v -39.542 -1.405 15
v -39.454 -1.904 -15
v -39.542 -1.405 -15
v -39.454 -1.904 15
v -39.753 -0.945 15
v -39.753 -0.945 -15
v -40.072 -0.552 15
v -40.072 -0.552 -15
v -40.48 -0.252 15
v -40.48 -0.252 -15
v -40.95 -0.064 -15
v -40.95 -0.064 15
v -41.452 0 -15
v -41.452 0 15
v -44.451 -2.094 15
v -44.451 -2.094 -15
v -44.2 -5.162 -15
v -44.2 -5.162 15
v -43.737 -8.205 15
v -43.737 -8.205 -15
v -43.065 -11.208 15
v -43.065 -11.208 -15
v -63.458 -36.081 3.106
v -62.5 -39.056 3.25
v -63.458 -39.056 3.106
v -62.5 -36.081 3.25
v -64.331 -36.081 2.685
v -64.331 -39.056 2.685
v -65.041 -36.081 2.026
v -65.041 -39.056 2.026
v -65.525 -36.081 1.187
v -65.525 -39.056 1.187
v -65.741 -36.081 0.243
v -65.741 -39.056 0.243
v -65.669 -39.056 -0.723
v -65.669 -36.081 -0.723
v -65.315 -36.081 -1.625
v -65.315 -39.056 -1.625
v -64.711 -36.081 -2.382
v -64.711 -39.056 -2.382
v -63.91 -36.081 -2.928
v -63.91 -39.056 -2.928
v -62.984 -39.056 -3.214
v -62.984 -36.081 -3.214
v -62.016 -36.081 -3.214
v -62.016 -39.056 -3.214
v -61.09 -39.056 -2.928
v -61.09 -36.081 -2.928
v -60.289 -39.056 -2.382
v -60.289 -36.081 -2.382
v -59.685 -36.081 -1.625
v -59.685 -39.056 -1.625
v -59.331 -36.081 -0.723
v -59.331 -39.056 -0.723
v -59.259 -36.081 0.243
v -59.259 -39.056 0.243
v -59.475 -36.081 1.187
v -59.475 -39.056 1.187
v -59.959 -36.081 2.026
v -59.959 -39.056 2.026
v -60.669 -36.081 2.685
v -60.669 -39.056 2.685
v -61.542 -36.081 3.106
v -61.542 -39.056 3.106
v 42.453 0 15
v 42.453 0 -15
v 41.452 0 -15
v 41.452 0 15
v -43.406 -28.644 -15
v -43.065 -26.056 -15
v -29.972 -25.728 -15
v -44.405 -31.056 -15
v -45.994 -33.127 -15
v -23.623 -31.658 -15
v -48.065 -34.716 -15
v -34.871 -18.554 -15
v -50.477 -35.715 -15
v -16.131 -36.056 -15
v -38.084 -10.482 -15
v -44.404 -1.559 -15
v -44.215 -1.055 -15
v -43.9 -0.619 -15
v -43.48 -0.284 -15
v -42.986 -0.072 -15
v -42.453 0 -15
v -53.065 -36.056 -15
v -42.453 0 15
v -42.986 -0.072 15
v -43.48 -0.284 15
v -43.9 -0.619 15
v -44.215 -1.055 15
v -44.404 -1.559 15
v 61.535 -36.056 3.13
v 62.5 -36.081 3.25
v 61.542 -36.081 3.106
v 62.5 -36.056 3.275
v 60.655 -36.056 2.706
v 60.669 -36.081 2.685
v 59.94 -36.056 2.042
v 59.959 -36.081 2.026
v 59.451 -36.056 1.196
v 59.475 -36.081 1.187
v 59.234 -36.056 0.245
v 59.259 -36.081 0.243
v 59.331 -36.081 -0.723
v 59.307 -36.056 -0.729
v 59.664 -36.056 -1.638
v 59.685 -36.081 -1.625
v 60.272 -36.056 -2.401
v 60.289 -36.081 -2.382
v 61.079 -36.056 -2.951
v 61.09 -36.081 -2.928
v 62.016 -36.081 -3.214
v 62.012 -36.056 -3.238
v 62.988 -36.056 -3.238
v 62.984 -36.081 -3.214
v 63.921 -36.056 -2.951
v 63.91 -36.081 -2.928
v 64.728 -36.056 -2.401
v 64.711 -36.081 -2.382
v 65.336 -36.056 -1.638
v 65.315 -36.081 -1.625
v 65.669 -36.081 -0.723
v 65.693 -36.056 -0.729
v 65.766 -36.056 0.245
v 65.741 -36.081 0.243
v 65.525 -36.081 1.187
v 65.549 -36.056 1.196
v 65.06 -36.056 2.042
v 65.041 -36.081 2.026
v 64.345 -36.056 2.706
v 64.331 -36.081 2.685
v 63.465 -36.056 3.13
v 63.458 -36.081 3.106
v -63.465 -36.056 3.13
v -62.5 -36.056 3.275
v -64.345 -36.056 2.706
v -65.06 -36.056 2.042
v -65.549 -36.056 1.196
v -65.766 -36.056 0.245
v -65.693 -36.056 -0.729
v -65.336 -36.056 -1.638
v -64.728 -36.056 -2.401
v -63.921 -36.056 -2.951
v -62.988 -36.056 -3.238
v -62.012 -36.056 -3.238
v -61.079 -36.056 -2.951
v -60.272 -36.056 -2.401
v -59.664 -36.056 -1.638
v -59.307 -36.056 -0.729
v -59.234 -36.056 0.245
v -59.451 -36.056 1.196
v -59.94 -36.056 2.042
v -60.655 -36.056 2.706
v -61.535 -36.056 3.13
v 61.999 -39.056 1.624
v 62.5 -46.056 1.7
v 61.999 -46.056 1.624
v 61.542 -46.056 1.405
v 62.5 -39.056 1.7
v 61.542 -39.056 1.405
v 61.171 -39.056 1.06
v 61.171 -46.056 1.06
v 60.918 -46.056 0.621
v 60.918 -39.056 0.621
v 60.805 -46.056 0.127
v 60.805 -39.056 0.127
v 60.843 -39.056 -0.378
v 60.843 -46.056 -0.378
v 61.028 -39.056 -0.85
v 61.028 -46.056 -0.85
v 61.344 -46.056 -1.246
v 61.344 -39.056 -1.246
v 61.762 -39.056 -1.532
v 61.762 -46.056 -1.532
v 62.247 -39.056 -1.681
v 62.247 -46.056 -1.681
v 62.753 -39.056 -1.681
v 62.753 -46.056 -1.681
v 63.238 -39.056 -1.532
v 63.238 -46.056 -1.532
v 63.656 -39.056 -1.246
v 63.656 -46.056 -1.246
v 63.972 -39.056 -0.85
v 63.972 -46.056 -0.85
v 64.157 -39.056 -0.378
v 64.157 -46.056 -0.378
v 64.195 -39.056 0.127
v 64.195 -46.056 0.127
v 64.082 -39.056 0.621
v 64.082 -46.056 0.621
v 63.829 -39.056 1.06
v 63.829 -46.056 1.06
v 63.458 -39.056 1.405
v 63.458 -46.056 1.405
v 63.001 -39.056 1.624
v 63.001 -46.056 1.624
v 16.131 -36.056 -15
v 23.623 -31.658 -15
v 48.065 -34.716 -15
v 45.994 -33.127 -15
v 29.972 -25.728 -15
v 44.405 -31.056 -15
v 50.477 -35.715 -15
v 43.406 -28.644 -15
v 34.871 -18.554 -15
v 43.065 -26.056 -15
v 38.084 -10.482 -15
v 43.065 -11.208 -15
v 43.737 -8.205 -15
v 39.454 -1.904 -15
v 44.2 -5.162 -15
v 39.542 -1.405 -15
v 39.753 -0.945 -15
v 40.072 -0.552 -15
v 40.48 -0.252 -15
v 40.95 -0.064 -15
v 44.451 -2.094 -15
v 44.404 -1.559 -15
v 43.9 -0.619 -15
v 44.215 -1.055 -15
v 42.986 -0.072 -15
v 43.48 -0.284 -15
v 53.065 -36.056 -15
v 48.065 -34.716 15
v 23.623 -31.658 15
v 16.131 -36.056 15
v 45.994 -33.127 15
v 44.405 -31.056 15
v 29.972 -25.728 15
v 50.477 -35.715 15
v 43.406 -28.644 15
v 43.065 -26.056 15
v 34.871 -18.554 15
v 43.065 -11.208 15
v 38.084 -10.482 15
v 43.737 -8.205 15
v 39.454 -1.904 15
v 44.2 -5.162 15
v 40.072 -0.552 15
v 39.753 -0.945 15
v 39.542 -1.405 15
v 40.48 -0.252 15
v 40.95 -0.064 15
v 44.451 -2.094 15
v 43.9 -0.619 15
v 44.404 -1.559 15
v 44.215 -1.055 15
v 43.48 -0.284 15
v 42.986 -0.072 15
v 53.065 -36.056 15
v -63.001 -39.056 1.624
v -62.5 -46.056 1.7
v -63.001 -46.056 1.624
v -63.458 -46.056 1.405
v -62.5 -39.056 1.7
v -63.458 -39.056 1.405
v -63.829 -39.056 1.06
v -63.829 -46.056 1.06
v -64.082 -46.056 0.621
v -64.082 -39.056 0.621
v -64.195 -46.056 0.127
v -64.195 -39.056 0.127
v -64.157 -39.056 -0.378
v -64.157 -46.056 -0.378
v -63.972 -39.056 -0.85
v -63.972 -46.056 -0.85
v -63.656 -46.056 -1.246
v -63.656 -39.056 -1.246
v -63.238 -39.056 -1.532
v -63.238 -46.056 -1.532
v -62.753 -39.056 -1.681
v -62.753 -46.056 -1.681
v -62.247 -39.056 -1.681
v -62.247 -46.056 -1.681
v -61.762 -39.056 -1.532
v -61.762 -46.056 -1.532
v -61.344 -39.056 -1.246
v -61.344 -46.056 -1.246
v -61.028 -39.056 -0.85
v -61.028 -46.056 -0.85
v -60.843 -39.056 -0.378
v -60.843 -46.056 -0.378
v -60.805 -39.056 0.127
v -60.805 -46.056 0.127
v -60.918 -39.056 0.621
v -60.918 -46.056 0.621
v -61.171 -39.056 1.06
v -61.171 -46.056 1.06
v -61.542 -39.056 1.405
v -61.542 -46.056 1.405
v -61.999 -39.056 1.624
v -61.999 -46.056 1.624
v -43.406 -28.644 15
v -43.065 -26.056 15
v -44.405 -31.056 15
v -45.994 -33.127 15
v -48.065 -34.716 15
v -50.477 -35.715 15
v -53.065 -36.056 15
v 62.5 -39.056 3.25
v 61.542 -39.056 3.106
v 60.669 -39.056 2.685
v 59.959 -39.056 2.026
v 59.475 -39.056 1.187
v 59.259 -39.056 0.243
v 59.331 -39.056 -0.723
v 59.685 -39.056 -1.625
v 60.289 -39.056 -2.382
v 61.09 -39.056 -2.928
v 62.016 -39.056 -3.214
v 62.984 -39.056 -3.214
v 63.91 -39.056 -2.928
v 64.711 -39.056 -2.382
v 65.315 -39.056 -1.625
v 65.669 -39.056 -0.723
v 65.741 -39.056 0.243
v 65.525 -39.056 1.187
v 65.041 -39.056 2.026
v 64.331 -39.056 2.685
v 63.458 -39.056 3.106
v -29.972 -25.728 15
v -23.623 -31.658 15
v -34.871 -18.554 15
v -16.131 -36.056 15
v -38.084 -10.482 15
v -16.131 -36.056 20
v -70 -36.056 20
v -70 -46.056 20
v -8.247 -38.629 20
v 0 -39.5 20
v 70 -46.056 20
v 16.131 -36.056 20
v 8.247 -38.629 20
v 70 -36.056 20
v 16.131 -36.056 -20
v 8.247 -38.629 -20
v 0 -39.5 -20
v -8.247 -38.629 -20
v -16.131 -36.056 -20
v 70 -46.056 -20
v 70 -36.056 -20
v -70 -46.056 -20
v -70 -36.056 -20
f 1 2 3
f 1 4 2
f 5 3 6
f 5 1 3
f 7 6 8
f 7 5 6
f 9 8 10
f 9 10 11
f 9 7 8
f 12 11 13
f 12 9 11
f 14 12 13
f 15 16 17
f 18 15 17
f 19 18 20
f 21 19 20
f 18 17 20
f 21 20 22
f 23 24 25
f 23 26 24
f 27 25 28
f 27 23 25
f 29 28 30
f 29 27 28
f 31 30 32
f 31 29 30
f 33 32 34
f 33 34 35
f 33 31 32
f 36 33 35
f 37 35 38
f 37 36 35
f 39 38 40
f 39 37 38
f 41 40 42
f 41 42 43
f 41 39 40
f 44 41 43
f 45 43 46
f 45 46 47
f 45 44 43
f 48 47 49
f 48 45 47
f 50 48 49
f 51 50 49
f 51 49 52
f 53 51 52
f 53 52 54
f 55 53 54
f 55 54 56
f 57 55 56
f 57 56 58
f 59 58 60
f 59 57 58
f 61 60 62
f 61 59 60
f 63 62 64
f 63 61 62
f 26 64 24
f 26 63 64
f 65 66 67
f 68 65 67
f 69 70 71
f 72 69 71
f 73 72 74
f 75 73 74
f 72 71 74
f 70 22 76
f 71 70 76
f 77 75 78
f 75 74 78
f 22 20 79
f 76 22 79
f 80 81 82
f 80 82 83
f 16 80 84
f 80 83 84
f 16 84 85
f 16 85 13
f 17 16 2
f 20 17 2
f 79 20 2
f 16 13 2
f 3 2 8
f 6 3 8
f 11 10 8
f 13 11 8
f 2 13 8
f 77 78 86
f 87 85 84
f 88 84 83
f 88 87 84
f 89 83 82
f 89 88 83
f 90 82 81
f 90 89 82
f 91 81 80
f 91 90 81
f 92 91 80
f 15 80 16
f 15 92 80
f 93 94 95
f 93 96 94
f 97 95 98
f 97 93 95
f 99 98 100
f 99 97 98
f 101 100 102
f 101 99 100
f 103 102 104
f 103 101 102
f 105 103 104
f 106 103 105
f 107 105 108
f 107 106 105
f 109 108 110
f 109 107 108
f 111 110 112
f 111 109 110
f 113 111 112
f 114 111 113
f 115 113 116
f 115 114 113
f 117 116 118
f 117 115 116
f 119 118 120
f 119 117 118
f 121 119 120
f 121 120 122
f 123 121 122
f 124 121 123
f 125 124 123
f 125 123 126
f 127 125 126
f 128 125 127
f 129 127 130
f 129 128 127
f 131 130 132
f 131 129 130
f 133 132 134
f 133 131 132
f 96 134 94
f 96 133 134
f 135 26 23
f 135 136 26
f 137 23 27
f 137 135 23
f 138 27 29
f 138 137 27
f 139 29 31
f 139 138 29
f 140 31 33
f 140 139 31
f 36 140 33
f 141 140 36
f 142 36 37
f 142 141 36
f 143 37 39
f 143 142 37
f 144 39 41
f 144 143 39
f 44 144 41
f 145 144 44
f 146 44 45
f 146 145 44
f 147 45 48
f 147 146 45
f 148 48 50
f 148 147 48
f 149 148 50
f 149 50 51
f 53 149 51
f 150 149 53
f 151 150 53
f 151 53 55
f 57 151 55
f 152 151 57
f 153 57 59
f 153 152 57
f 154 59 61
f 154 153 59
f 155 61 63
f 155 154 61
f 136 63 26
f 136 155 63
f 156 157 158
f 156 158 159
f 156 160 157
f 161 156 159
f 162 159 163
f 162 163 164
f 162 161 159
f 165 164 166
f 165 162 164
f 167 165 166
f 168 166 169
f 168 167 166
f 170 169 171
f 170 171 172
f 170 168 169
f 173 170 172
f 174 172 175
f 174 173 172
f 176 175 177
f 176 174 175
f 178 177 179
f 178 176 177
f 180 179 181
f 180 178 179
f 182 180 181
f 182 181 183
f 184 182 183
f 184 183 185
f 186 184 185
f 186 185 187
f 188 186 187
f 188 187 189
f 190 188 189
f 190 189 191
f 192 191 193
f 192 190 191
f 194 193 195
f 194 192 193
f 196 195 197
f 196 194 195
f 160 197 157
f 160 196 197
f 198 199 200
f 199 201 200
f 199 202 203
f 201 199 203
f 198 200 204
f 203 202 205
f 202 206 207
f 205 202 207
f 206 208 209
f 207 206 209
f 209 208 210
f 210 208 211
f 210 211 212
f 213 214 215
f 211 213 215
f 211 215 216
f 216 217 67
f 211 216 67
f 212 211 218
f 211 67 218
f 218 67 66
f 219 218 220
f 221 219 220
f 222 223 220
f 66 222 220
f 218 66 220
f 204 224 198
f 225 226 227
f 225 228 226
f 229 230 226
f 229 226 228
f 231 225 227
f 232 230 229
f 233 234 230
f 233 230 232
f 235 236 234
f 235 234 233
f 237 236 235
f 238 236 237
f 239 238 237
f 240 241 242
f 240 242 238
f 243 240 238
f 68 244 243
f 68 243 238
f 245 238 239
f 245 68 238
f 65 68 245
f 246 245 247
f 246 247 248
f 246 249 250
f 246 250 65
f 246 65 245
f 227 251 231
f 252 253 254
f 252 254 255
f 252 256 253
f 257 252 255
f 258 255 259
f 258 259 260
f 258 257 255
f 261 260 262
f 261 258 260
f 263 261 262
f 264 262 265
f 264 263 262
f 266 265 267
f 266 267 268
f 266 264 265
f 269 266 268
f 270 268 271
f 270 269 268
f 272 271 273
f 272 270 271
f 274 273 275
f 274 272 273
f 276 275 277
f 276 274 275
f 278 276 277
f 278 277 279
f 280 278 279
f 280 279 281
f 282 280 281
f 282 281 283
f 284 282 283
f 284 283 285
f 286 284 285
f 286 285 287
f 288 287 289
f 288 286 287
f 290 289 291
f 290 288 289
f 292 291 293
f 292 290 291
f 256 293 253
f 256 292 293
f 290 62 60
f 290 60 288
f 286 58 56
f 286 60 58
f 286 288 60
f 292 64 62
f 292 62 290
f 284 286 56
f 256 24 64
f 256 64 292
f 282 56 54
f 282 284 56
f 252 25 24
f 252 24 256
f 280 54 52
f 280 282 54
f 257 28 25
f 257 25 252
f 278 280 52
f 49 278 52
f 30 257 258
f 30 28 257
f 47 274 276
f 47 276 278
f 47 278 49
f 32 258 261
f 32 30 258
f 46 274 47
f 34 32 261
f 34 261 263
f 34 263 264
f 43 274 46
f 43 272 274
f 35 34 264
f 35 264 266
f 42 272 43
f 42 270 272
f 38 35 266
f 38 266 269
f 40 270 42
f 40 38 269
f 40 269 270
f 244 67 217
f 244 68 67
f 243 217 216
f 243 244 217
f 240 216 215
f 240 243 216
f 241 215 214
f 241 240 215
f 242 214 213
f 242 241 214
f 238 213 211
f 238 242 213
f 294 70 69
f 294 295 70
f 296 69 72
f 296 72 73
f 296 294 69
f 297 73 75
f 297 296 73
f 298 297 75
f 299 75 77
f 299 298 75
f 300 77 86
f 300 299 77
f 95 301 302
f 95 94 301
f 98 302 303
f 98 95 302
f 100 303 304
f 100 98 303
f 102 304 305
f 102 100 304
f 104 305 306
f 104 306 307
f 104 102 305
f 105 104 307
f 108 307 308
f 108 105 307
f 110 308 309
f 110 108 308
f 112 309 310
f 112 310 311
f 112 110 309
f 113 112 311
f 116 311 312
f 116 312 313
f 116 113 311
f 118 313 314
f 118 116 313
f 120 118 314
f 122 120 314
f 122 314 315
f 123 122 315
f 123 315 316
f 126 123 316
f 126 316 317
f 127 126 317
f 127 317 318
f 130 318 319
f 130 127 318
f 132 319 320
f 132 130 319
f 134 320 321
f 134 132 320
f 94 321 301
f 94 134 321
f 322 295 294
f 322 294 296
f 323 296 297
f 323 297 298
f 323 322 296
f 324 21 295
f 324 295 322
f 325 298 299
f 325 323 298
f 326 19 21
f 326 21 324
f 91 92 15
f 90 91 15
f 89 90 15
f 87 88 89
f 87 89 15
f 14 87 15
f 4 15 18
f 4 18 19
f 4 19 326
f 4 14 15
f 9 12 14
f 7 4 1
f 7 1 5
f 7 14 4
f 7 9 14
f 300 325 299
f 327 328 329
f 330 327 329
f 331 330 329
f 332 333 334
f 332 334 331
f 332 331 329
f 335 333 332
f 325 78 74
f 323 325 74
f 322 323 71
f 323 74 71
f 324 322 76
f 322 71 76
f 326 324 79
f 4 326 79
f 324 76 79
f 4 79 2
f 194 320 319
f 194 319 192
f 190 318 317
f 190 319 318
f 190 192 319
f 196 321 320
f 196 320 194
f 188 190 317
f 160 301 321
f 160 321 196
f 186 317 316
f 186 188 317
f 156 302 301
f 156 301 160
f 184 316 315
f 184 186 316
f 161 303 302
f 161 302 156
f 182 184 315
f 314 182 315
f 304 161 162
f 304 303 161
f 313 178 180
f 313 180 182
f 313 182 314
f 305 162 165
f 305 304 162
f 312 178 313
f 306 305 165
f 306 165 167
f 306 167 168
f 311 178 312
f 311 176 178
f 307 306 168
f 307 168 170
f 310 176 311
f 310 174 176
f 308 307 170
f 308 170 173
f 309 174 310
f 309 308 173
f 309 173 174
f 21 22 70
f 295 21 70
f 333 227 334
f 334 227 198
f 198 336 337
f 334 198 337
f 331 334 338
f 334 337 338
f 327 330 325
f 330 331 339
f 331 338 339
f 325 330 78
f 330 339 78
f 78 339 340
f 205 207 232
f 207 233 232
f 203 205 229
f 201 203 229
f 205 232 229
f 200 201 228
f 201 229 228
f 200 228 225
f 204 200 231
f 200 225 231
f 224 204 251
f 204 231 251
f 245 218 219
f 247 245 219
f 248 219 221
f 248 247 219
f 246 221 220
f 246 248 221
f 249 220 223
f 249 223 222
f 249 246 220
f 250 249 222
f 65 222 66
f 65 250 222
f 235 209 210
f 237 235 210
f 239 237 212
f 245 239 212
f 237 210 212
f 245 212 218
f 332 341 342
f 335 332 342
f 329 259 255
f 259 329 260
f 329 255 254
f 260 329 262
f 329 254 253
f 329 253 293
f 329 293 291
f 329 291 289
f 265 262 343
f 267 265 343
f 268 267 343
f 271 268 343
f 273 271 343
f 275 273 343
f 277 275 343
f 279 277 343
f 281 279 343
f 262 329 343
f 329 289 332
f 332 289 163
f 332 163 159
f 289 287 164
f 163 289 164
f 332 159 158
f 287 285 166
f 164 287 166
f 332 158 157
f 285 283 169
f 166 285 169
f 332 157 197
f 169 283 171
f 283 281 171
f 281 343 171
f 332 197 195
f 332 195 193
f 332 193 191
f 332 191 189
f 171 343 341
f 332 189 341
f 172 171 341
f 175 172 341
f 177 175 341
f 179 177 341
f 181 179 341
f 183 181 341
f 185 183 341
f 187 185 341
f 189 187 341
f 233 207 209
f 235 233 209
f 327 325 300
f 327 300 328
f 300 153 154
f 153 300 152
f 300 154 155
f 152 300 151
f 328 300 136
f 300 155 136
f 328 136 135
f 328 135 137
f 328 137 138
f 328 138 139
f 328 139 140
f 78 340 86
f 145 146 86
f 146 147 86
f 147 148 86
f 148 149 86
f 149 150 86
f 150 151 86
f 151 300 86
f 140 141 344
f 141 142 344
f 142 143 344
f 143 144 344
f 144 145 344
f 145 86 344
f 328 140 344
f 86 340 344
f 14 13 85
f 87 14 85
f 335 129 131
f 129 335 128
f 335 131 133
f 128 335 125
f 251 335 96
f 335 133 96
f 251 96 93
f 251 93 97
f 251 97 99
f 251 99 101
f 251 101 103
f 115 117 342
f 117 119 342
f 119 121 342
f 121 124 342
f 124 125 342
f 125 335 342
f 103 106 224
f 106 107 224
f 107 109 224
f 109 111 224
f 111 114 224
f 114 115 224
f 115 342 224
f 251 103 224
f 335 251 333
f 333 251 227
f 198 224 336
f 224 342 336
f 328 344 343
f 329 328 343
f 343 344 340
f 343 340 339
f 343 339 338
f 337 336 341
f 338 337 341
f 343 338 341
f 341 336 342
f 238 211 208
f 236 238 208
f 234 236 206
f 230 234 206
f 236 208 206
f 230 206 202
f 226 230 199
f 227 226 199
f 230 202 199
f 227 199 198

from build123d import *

# Parameters (mm, degrees)
BOSS_EXTRUDE3_DEPTH           = 20
BOSS_EXTRUDE3_DEPTH_BACK      = 20
BOSS_EXTRUDE4_DEPTH           = 15
BOSS_EXTRUDE4_DEPTH_BACK      = 15
BOSS_EXTRUDE5_DEPTH           = 15
BOSS_EXTRUDE5_DEPTH_BACK      = 15
FILLET1_R                     = 10
CBORE_FOR_M3_SHCS1_AT_2_COUNT = 2
CBORE_FOR_M3_SHCS1_AT_2_PITCH = 125
FILLET2_R                     = 2


with BuildPart() as part:
    # Sketch1 → Boss-Extrude3 (new, two sides: drawn at the far end of the back side and taken through both)
    with BuildSketch(Plane.XY.offset(-BOSS_EXTRUDE3_DEPTH_BACK)):
        with BuildLine():
            Line((-43.065388601, -36.056178761), (-70, -36.056178761))
            Line((-70, -36.056178761), (-70, -46.056178761))
            Line((-70, -46.056178761), (70, -46.056178761))
            Line((70, -46.056178761), (70, -36.056178761))
            Line((70, -36.056178761), (43.065388601, -36.056178761))
            Line((43.065388601, -36.056178761), (26.080681992, -36.056178761))
            Line((26.080681992, -36.056178761), (16.130777202, -36.056178761))
            ThreePointArc((16.130777202, -36.056178761), (0, -39.5), (-16.130777202, -36.056178761))
            Line((-16.130777202, -36.056178761), (-26.080681992, -36.056178761))
            Line((-26.080681992, -36.056178761), (-43.065388601, -36.056178761))
        make_face()
    extrude(amount=BOSS_EXTRUDE3_DEPTH + BOSS_EXTRUDE3_DEPTH_BACK)

    # Sketch1<6> → Boss-Extrude4 (add, two sides: drawn at the far end of the back side and taken through both)
    with BuildSketch(Plane.XY.offset(-BOSS_EXTRUDE4_DEPTH_BACK)):
        with BuildLine():
            ThreePointArc((-44.5, 0), (-39.628527279, -20.24425414), (-26.080681992, -36.056178761))
            Line((-26.080681992, -36.056178761), (-16.130777202, -36.056178761))
            ThreePointArc((-16.130777202, -36.056178761), (-33.146762281, -21.483532071), (-39.5, 0))
            Line((-39.5, 0), (-44.5, 0))
        make_face()
        with BuildLine():
            ThreePointArc((39.5, 0), (33.146762281, -21.483532071), (16.130777202, -36.056178761))
            Line((16.130777202, -36.056178761), (26.080681992, -36.056178761))
            ThreePointArc((26.080681992, -36.056178761), (39.628527279, -20.24425414), (44.5, 0))
            Line((44.5, 0), (39.5, 0))
        make_face()
    extrude(amount=BOSS_EXTRUDE4_DEPTH + BOSS_EXTRUDE4_DEPTH_BACK)

    # Sketch1<7> → Boss-Extrude5 (add, two sides: drawn at the far end of the back side and taken through both)
    with BuildSketch(Plane.XY.offset(-BOSS_EXTRUDE5_DEPTH_BACK)):
        with BuildLine():
            Line((-43.065388601, -11.208135645), (-43.065388601, -36.056178761))
            Line((-43.065388601, -36.056178761), (-26.080681992, -36.056178761))
            ThreePointArc((-26.080681992, -36.056178761), (-36.737597653, -25.111728708), (-43.065388601, -11.208135645))
        make_face()
        with BuildLine():
            Line((26.080681992, -36.056178761), (43.065388601, -36.056178761))
            Line((43.065388601, -36.056178761), (43.065388601, -11.208135645))
            ThreePointArc((43.065388601, -11.208135645), (36.737597653, -25.111728708), (26.080681992, -36.056178761))
        make_face()
    extrude(amount=BOSS_EXTRUDE5_DEPTH + BOSS_EXTRUDE5_DEPTH_BACK)

    # Fillet1
    fillet1_edges = [part.edges().sort_by_distance(p)[0] for p in [
        (43.065388601, -36.056178761, 0),
        (-43.065388601, -36.056178761, 0),
    ]]
    fillet(fillet1_edges, radius=FILLET1_R)

    # Sketch4 → CBORE for M3 SHCS1 (revolve, cut)
    with BuildSketch(Plane(origin=(-62.5, -36.056178761, 0), x_dir=(0, 0, 1), z_dir=(1, 0, 0))):
        Polygon((0, 0), (0, 10), (1.7, 10), (1.7, 3), (3.25, 3), (3.25, 0.025), (3.275, 0), align=None)
    cbore_for_m3_shcs1 = revolve(axis=Axis((-62.5, -29.706178761, 0), (0, -1, 0)), mode=Mode.SUBTRACT)

    # CBORE for M3 SHCS1 at 2: CBORE for M3 SHCS1 ×2
    with Locations(*[(i * CBORE_FOR_M3_SHCS1_AT_2_PITCH, 0, 0) for i in range(1, CBORE_FOR_M3_SHCS1_AT_2_COUNT)]):
        add(cbore_for_m3_shcs1, mode=Mode.SUBTRACT)

    # Fillet2
    fillet2_edges = [part.edges().sort_by_distance(p)[0] for p in [
        (-44.5, 0, 0),
        (-39.5, 0, 0),
        (44.5, 0, 0),
        (39.5, 0, 0),
    ]]
    fillet(fillet2_edges, radius=FILLET2_R)


solid = part.part
